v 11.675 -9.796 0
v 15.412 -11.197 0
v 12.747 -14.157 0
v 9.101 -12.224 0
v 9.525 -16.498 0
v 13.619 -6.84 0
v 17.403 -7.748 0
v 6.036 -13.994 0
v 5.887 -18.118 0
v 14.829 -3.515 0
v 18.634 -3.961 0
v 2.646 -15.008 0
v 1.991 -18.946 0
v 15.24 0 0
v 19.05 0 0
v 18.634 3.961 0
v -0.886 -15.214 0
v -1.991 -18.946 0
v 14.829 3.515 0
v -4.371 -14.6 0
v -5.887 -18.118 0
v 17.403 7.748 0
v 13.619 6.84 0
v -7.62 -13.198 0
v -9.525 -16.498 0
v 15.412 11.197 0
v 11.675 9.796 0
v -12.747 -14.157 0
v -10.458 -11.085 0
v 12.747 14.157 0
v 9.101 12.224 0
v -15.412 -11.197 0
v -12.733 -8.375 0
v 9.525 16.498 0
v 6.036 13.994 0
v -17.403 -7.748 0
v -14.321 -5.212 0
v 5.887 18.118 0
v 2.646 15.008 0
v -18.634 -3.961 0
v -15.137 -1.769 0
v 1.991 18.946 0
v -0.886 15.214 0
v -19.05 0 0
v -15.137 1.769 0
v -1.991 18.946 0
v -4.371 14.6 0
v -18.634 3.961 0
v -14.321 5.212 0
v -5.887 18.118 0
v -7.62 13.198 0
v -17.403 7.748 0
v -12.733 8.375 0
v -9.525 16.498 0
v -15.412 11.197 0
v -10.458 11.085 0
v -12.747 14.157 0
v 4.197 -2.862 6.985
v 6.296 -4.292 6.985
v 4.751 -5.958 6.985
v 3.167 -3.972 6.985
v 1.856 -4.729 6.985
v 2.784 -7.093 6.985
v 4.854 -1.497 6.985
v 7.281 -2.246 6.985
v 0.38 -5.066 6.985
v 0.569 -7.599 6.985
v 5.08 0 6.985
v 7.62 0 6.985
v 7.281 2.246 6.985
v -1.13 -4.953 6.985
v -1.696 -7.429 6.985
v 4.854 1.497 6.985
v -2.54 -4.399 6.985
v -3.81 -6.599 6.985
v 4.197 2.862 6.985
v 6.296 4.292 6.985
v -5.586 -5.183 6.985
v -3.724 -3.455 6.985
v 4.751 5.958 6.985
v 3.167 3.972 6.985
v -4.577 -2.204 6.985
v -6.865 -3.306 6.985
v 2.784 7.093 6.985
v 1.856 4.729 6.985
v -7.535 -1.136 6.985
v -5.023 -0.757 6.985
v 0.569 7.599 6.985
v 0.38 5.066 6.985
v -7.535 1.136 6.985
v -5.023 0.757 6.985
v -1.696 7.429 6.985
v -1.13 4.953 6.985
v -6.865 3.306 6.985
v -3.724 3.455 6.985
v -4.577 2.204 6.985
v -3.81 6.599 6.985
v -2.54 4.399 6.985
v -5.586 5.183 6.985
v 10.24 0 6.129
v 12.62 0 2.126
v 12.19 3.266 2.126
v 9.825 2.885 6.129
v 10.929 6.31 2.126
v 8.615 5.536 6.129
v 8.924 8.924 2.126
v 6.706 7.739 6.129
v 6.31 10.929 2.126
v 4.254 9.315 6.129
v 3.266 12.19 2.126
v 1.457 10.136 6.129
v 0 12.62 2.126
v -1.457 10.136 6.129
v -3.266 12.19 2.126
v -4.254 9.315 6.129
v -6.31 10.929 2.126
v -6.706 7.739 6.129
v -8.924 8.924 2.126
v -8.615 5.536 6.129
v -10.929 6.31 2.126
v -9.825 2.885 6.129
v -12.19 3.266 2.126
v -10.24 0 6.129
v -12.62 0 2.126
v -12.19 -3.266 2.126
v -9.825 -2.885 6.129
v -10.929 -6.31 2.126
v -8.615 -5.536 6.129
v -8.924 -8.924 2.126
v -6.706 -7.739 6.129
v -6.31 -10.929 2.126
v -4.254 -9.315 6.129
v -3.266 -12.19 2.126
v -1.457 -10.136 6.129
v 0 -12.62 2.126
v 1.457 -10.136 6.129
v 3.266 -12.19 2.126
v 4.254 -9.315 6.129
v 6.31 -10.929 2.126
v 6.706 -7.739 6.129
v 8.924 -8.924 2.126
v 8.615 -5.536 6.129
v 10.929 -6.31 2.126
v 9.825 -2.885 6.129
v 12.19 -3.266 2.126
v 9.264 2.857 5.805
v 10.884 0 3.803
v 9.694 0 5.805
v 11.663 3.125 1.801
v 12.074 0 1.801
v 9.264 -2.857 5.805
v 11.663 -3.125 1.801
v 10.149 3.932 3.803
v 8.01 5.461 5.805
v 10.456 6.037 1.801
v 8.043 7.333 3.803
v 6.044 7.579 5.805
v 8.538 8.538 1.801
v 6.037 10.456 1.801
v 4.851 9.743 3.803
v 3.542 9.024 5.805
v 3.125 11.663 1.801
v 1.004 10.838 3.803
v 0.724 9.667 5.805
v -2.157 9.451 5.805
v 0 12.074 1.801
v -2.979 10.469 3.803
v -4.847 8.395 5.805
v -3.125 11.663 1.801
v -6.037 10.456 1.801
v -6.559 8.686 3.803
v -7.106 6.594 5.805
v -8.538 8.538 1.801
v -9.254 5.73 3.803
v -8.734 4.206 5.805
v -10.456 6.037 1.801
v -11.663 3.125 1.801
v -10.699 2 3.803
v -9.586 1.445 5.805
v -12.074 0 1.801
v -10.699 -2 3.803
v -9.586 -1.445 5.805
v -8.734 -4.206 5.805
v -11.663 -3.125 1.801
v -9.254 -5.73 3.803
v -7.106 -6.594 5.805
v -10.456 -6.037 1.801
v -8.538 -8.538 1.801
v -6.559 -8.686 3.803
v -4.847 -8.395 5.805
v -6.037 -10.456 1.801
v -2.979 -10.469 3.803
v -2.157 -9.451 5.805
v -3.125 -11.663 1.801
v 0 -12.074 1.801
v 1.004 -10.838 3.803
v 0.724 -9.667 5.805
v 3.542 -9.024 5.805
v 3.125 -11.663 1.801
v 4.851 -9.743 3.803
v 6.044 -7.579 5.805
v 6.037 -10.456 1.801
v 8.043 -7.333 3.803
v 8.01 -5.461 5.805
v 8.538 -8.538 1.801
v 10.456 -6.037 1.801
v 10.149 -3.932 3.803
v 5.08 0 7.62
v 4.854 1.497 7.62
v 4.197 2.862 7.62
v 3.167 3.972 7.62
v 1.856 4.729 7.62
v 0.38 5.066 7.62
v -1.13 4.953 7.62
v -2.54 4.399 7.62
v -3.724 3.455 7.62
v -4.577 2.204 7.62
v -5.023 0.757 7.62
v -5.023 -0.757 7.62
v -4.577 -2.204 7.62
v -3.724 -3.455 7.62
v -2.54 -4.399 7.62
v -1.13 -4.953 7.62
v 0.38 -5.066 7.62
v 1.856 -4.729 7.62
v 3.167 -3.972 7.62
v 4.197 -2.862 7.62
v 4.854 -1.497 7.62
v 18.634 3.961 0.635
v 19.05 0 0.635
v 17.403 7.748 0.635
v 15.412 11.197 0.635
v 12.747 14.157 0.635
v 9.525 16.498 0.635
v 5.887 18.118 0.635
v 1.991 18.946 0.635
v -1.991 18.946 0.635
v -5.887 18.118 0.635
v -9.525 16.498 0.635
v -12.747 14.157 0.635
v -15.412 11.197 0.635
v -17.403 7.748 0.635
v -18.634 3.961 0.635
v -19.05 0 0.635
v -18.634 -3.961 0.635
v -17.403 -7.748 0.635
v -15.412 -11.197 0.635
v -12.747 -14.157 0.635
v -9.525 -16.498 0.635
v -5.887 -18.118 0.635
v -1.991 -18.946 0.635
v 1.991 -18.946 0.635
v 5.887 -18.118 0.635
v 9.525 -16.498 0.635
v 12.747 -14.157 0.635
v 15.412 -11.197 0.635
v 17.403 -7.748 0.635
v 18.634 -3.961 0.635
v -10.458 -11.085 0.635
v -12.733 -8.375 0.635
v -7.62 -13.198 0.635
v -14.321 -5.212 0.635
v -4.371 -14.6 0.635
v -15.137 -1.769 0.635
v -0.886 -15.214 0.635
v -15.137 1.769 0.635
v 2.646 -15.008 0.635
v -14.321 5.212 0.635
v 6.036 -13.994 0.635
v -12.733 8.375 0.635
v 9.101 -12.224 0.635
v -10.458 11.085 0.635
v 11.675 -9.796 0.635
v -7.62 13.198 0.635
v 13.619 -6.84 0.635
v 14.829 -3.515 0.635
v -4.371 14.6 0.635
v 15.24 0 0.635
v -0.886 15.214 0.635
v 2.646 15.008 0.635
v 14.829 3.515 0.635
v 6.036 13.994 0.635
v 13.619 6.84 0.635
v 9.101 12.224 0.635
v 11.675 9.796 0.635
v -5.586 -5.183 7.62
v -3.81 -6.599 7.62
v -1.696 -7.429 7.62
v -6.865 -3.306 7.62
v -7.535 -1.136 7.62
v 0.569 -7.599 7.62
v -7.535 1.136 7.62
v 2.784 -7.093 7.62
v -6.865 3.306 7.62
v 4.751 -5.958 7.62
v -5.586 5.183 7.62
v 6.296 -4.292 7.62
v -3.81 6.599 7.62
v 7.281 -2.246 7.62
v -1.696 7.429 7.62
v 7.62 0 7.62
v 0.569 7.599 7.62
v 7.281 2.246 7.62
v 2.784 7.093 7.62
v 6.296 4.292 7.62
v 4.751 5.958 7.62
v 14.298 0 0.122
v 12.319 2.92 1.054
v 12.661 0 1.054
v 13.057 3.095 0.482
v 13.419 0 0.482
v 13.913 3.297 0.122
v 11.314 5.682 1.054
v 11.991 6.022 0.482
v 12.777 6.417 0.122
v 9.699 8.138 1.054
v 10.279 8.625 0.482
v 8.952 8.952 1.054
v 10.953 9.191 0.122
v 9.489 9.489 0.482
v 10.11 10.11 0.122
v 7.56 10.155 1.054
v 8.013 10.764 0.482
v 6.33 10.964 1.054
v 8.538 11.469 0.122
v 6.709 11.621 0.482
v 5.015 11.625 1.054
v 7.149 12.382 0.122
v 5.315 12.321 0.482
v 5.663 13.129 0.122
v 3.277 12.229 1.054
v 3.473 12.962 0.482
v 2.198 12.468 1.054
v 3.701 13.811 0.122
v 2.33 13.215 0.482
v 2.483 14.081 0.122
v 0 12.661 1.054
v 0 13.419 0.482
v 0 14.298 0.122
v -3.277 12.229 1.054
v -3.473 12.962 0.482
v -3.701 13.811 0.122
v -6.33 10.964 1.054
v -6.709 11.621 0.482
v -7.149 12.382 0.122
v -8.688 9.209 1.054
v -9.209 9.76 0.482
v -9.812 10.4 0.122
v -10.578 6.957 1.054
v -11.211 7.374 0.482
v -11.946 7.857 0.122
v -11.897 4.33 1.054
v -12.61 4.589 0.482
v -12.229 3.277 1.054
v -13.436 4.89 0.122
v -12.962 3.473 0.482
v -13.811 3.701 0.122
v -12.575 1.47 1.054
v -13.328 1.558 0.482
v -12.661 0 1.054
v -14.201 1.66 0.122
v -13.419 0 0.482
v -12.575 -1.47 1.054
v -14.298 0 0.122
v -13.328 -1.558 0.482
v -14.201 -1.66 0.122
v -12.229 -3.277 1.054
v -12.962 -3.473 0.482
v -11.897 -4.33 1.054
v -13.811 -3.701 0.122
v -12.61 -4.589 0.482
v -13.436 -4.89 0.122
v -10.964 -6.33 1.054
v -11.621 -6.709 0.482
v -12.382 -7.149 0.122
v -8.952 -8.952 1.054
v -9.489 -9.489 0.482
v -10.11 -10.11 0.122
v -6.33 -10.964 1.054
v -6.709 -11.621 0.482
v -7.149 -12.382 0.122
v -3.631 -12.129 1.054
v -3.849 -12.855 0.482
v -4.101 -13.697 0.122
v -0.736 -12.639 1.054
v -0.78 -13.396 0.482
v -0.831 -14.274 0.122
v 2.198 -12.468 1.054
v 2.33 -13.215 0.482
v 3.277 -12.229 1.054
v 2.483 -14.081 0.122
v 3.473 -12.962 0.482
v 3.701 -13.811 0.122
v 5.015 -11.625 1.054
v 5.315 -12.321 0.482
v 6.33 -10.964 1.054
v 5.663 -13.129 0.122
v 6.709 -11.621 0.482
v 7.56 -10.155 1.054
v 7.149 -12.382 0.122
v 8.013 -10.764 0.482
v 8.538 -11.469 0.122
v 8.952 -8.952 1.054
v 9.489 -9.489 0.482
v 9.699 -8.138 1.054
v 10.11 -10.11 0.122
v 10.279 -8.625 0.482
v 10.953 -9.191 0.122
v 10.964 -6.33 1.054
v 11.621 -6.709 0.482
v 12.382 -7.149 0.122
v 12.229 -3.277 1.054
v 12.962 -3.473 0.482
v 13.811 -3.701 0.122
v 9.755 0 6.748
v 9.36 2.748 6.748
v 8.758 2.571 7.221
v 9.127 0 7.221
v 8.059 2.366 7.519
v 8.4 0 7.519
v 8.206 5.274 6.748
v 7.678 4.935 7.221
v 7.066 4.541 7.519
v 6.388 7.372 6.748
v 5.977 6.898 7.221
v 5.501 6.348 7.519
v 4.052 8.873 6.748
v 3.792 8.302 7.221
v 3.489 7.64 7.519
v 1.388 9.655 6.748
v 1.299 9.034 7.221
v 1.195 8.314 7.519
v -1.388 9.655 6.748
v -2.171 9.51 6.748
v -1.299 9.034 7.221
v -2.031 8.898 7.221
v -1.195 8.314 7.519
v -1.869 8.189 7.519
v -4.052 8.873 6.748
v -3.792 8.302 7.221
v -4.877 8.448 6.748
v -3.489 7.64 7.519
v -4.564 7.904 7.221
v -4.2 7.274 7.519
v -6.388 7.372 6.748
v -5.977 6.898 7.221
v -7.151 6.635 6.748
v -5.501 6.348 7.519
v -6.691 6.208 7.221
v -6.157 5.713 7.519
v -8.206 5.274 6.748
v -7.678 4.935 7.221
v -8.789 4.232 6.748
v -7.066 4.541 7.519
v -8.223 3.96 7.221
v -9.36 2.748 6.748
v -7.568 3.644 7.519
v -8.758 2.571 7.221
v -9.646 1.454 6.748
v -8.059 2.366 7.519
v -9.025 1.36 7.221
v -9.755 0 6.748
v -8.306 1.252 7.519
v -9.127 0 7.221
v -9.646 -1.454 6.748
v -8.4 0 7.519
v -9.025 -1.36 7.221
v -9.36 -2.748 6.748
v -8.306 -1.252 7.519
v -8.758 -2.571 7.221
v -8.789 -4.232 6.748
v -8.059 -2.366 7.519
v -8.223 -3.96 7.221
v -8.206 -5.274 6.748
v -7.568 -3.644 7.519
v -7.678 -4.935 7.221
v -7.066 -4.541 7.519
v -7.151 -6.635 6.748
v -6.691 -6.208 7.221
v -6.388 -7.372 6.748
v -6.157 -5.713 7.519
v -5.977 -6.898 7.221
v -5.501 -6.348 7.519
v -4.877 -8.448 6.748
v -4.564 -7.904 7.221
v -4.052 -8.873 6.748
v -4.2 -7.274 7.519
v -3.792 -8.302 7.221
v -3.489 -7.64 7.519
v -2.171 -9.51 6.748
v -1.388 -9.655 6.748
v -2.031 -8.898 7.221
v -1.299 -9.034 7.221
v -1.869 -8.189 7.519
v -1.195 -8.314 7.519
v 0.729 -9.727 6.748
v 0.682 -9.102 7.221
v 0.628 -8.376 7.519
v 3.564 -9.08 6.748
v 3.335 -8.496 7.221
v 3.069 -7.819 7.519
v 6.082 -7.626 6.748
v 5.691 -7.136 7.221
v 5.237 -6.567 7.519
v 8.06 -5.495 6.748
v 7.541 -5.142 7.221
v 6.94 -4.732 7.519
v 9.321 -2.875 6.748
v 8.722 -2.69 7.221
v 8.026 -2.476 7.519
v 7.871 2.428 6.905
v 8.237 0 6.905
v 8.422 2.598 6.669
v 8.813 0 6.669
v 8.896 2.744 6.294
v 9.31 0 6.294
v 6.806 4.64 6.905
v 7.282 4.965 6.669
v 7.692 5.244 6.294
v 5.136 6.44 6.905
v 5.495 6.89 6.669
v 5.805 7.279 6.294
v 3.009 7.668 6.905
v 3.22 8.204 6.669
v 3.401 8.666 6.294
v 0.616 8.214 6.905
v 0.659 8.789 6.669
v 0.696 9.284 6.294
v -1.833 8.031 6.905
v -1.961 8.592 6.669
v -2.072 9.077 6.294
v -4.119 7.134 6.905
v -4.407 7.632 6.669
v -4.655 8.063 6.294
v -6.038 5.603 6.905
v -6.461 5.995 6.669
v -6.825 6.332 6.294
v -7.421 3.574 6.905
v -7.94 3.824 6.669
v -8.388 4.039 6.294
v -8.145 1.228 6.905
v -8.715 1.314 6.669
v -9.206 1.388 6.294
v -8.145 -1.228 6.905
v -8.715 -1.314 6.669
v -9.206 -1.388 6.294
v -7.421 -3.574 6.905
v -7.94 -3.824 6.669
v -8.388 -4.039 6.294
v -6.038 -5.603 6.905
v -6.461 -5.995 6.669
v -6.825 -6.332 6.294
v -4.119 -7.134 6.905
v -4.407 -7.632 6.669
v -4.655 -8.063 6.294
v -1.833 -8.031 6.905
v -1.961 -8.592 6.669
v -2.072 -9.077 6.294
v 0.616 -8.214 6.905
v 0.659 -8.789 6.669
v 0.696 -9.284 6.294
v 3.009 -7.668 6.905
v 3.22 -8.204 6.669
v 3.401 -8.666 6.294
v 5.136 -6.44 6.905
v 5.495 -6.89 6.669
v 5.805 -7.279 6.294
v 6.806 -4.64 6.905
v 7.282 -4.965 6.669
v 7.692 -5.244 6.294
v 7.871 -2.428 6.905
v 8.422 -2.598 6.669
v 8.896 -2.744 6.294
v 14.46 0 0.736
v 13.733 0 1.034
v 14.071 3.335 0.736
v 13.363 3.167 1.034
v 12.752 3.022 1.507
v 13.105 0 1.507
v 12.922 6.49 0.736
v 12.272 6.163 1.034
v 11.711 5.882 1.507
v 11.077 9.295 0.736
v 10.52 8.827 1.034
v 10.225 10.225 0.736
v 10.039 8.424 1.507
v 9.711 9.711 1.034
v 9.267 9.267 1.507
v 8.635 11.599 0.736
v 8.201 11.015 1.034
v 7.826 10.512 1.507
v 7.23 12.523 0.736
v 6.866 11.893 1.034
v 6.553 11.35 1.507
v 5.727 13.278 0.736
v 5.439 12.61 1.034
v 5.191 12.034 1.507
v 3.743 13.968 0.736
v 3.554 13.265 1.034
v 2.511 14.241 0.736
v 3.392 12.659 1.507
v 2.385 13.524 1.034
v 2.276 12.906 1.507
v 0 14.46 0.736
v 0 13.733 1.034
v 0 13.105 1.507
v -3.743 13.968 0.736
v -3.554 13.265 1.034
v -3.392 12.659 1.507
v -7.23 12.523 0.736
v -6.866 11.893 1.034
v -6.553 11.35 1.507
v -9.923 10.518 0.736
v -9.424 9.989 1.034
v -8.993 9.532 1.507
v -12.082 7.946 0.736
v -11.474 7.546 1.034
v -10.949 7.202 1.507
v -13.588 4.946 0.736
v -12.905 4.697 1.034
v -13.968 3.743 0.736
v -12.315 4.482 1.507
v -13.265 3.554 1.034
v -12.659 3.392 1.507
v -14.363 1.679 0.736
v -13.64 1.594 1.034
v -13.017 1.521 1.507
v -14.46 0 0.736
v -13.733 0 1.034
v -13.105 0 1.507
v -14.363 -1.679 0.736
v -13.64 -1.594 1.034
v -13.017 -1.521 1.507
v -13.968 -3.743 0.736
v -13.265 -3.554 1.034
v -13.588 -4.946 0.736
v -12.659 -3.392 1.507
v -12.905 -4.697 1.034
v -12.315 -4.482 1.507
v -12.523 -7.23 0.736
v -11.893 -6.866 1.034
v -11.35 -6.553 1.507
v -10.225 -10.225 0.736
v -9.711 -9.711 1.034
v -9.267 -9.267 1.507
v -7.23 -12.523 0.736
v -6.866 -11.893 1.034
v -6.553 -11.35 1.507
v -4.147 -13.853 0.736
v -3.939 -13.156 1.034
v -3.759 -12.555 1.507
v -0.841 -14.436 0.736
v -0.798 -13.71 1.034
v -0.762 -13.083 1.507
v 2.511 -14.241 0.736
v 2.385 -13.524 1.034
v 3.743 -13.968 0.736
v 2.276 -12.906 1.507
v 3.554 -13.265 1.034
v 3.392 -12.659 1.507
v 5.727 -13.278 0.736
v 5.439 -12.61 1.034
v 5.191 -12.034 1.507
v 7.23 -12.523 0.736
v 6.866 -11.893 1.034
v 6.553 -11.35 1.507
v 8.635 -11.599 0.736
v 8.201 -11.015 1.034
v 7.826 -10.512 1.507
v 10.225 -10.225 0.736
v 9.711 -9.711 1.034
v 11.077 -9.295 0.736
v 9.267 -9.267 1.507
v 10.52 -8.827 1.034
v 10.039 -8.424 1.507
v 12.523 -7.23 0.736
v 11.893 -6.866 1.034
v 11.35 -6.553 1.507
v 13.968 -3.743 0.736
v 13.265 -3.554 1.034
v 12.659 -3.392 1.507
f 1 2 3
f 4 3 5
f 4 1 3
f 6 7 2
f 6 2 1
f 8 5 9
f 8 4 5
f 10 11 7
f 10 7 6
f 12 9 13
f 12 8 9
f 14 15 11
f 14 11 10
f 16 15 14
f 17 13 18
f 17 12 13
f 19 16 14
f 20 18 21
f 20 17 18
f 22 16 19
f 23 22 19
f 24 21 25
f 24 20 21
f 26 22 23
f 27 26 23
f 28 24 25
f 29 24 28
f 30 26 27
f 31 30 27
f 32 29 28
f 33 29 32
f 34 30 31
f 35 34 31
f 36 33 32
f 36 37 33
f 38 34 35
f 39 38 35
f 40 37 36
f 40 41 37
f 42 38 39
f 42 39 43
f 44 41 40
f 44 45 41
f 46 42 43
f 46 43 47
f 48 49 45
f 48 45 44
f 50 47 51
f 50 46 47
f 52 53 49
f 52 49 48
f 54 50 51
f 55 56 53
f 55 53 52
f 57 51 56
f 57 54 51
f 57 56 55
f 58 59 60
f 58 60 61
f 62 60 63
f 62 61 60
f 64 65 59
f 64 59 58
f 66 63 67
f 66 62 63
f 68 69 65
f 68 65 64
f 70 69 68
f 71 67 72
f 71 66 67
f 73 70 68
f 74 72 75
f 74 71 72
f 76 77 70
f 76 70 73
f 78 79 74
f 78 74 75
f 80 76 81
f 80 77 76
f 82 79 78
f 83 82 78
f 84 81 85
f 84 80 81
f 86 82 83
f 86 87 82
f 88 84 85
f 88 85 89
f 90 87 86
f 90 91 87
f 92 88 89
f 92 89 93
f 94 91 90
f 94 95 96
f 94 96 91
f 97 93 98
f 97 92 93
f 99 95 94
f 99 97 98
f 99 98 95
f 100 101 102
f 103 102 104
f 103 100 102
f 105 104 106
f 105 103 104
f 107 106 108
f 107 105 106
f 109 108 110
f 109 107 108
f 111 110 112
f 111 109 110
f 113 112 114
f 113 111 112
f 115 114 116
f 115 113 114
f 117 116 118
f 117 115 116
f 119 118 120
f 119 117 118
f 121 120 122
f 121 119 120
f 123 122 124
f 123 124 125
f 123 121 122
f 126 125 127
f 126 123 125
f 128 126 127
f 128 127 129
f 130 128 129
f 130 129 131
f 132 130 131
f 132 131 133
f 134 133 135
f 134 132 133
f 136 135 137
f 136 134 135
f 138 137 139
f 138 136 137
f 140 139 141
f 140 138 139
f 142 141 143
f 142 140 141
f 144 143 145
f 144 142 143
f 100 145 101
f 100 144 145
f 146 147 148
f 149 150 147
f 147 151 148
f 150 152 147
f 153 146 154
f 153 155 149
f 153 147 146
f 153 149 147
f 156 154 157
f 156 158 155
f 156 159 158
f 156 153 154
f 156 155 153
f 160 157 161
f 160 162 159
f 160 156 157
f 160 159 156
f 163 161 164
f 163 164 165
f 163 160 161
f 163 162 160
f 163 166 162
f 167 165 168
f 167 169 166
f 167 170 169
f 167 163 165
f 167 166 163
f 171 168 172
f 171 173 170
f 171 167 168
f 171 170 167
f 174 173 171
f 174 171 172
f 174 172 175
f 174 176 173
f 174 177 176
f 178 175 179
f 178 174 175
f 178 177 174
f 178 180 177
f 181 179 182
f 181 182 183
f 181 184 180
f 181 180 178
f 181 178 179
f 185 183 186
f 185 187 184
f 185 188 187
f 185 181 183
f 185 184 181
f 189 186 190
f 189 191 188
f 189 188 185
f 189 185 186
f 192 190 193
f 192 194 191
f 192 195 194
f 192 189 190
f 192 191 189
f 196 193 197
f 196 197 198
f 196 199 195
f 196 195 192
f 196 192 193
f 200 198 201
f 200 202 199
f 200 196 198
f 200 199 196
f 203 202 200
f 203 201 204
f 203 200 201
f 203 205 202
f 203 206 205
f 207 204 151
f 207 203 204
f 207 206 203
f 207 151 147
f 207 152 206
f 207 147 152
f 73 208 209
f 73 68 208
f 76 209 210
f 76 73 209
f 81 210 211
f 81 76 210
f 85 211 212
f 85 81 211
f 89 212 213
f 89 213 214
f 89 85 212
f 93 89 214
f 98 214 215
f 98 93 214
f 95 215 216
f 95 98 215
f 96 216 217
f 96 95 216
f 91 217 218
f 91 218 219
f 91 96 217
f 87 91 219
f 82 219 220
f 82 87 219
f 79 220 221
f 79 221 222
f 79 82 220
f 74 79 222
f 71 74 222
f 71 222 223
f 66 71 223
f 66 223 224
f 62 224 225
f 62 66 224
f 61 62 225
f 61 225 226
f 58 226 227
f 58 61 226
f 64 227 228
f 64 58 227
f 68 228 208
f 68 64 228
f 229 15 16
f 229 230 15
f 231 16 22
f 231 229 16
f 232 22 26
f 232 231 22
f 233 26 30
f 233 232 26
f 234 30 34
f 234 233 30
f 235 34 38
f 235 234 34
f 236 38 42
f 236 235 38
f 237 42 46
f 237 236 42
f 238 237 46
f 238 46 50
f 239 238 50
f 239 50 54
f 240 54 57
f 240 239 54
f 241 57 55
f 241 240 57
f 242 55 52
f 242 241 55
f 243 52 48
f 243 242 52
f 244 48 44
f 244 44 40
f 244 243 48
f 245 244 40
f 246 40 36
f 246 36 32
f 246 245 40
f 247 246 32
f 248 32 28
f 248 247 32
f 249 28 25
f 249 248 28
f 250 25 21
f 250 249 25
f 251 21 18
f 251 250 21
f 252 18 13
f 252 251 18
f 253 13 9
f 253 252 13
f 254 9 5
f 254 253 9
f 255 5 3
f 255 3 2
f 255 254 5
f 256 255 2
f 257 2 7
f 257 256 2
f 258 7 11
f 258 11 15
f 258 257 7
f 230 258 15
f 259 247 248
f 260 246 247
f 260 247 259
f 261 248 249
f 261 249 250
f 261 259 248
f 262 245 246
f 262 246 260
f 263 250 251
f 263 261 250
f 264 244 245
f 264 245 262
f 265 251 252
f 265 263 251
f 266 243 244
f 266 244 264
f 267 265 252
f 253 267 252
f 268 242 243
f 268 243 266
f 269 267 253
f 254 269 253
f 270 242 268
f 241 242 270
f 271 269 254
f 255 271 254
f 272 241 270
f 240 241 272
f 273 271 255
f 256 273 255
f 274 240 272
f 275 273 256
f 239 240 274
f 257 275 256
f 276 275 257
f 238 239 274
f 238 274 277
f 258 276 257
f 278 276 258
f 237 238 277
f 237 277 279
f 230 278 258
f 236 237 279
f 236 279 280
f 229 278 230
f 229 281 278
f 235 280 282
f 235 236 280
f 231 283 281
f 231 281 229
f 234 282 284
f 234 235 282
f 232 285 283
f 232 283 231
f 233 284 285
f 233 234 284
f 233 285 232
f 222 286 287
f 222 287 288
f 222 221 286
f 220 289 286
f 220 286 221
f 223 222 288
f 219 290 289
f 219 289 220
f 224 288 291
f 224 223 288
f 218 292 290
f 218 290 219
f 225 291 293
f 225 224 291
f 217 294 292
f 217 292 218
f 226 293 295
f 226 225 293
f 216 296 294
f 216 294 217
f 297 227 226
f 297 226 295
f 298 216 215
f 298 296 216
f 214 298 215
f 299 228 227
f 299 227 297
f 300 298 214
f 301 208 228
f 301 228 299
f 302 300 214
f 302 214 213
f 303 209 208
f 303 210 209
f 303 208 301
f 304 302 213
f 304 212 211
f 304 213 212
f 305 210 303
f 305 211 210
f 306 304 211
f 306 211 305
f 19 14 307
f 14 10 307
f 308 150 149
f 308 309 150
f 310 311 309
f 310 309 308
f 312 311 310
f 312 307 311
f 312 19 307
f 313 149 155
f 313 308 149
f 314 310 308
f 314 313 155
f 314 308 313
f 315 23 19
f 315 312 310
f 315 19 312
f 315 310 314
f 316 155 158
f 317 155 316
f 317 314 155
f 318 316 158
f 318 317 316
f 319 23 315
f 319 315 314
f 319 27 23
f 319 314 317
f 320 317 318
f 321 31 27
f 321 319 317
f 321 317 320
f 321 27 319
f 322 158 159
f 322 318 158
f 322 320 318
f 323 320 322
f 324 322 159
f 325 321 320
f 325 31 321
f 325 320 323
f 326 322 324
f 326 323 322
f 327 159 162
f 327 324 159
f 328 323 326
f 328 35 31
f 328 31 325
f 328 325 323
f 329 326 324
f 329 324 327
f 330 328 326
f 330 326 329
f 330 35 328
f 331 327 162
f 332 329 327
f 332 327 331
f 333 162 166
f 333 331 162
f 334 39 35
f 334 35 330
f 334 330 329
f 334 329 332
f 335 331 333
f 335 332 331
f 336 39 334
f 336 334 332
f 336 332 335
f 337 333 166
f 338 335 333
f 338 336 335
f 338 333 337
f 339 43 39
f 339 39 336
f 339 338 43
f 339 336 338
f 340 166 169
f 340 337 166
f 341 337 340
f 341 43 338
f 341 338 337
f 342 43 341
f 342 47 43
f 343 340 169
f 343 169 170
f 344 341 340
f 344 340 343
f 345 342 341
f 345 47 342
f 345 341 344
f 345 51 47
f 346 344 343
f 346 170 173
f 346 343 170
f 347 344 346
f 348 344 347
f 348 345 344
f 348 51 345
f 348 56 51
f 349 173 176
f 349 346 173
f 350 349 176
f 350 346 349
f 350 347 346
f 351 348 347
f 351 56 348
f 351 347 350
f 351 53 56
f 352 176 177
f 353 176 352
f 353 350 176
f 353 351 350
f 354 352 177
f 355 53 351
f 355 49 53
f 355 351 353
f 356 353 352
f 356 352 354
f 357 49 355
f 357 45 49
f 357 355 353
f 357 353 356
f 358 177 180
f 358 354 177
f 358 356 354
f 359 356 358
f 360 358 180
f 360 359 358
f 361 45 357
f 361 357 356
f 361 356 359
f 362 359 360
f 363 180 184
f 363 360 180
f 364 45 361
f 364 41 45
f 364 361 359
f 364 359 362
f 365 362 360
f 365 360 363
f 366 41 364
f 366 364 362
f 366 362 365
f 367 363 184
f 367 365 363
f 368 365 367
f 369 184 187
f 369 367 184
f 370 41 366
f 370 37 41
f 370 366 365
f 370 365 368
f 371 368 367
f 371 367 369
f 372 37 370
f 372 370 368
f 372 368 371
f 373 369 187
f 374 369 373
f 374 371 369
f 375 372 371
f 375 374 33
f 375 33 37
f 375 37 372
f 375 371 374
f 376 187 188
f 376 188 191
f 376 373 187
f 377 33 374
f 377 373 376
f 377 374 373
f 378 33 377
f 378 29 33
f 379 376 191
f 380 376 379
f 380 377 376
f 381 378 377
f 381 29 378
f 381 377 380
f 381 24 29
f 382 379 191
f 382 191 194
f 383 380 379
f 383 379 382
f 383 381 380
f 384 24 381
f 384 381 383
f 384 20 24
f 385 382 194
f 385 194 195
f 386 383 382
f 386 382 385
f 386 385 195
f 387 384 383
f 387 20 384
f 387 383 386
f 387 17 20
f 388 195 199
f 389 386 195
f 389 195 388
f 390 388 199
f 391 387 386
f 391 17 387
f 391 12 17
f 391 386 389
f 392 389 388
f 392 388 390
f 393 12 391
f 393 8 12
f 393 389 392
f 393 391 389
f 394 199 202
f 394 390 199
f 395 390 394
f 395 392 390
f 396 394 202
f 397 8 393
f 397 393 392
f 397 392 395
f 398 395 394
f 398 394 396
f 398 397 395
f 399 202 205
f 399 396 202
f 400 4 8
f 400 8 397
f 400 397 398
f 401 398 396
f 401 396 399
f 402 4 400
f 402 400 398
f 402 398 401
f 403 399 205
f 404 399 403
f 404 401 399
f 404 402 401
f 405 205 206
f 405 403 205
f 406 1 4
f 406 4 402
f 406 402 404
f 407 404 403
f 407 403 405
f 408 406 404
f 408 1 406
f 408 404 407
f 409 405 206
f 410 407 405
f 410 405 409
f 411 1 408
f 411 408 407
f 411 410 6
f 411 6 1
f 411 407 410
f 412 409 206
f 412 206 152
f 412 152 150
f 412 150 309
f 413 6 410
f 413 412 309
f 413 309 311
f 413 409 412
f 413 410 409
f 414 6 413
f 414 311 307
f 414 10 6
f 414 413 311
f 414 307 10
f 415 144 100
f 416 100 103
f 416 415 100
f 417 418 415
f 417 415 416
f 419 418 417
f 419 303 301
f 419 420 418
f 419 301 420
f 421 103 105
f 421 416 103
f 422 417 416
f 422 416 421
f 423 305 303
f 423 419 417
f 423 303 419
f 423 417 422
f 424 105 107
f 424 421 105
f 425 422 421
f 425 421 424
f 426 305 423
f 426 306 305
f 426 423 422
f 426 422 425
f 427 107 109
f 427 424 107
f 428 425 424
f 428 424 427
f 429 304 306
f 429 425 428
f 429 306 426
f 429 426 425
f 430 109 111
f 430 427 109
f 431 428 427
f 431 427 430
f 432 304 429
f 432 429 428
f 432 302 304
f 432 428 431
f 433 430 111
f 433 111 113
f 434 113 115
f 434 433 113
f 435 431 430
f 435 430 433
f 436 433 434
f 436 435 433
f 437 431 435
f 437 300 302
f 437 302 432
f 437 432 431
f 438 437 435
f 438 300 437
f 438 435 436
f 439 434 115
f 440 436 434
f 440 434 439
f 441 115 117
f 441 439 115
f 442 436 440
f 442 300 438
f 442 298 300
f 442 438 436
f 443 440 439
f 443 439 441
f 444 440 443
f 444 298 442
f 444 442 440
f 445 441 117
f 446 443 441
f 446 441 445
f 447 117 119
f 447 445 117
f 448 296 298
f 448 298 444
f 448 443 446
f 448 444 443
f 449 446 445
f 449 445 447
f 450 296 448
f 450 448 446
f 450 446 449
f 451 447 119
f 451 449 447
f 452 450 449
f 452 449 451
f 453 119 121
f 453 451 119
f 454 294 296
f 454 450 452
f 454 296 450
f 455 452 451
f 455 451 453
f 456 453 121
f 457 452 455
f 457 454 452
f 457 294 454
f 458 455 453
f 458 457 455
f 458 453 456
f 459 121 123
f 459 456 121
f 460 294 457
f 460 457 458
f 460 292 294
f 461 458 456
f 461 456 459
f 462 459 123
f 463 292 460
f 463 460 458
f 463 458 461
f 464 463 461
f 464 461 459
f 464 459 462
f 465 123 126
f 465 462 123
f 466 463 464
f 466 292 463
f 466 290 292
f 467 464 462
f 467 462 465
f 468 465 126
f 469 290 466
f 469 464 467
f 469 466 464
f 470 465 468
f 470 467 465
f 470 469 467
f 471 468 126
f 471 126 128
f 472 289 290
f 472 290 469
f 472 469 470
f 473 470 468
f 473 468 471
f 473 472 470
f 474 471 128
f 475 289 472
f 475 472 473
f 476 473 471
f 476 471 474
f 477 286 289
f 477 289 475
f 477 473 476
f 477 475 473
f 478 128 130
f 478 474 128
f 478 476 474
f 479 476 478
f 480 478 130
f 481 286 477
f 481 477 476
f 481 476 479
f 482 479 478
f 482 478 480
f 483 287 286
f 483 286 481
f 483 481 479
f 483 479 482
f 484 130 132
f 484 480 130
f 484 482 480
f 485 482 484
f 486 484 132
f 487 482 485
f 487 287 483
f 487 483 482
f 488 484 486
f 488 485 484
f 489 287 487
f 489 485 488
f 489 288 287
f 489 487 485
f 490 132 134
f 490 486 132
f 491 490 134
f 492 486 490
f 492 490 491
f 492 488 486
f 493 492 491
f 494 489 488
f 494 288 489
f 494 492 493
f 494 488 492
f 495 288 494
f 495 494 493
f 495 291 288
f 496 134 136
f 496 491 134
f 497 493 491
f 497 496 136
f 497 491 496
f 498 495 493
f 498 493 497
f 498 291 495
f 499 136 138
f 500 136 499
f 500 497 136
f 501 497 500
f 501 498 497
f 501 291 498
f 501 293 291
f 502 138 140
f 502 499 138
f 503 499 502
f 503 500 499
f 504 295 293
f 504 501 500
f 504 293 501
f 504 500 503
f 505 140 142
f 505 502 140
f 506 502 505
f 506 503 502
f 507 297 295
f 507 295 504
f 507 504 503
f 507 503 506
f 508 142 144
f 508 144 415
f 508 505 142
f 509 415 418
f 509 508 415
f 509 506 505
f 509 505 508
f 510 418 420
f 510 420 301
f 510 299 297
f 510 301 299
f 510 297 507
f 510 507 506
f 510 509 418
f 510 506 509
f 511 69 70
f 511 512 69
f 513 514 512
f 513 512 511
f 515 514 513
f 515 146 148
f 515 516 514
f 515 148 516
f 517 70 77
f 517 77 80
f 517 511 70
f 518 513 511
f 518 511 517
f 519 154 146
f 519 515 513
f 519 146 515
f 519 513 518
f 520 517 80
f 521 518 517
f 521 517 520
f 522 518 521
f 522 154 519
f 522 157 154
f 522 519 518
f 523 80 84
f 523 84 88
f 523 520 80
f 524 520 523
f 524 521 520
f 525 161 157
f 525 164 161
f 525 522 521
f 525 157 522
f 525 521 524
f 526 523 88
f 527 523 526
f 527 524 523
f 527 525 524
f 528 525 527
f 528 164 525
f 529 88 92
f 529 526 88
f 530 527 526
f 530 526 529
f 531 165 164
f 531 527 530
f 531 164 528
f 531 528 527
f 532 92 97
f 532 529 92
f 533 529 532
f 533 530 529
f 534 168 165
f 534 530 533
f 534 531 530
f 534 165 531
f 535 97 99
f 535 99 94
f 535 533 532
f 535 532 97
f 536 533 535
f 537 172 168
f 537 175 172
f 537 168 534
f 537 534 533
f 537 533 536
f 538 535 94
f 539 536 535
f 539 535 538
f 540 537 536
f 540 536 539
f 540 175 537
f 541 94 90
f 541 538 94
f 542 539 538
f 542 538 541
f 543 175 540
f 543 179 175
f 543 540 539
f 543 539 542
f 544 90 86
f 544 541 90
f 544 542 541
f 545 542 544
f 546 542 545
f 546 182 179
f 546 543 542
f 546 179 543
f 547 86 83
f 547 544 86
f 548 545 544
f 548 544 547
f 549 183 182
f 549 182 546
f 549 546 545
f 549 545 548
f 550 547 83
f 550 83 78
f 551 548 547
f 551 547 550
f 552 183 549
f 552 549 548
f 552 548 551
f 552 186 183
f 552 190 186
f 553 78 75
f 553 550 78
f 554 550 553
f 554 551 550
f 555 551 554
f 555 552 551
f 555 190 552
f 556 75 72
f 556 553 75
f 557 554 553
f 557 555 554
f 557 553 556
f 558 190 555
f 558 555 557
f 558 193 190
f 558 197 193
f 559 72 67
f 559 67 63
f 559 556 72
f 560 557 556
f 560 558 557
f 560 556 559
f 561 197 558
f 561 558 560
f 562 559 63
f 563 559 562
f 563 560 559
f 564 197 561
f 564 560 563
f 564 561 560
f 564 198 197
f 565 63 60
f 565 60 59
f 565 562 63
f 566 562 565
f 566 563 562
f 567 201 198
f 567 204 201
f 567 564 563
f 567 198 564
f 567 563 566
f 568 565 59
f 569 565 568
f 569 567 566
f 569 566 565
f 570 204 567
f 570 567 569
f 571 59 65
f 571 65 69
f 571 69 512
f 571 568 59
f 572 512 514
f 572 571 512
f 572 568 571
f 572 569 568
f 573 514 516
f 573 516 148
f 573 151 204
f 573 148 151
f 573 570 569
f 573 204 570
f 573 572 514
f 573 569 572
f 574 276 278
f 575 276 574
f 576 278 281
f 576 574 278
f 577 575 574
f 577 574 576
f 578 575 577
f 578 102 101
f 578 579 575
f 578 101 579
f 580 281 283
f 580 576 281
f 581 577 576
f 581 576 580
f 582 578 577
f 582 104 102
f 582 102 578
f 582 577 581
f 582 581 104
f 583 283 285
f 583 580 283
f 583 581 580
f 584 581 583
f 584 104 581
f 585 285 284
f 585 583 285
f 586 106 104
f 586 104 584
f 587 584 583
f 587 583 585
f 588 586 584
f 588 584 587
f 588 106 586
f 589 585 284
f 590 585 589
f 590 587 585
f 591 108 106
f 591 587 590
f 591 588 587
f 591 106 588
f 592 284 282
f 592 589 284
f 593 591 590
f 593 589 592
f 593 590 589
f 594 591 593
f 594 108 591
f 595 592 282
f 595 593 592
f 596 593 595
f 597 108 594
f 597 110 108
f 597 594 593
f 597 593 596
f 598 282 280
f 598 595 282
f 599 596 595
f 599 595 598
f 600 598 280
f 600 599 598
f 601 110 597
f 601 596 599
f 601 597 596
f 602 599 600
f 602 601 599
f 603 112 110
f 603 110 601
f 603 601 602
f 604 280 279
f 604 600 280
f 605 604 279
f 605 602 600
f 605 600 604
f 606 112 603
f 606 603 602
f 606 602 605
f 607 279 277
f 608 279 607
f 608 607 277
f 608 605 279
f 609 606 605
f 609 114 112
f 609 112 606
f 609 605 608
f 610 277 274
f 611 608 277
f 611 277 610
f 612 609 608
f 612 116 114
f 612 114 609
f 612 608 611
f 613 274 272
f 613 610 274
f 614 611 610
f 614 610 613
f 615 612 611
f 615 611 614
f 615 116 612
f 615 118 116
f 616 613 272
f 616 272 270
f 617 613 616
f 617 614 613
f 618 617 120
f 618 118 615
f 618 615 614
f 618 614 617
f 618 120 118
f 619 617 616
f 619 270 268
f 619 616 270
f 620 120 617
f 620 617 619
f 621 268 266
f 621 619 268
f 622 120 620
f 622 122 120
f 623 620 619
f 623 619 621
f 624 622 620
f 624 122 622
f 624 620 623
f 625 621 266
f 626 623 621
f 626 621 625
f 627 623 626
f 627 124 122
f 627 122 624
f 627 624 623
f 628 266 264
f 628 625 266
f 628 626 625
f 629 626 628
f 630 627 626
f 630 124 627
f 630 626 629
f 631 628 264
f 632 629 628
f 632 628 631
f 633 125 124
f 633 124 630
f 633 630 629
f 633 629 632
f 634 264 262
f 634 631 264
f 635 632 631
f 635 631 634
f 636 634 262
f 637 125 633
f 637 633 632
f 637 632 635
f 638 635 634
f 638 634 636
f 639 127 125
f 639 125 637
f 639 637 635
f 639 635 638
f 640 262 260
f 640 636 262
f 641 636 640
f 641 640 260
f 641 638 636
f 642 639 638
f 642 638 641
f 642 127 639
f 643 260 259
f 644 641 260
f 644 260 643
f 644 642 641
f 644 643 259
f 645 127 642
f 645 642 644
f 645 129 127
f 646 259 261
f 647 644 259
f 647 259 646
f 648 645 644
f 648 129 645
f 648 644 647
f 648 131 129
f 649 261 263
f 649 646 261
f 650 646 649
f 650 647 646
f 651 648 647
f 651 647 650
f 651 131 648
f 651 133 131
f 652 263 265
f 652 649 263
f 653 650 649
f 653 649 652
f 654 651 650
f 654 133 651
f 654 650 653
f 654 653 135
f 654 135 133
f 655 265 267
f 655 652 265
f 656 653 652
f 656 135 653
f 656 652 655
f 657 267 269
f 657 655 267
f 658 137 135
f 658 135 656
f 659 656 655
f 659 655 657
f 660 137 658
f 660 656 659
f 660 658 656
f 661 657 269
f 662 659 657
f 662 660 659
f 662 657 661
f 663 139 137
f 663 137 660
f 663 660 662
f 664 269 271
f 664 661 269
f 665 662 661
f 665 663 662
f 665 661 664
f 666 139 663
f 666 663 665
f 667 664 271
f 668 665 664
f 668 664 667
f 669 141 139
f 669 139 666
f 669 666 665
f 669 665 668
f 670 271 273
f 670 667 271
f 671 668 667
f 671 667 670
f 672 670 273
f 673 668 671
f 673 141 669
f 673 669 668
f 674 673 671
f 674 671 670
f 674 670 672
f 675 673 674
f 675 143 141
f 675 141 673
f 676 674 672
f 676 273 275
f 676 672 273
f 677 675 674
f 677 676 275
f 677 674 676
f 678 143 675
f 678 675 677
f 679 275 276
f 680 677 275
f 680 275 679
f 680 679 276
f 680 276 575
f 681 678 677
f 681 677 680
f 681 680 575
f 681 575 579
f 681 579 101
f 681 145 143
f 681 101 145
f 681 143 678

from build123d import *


with BuildPart() as f1:
    # F0 (on Front) → F1 (revolve)
    with BuildSketch(Plane.XZ):
        with BuildLine():
            Line((7.62, 7.62), (5.08, 7.62))
            Line((5.08, 7.62), (5.08, 6.985))
            Line((5.08, 6.985), (7.62, 6.985))
            ThreePointArc((7.62, 6.985), (8.813216, 6.669333), (9.694241, 5.804921))
            Line((9.694241, 5.804921), (12.074054, 1.801173))
            ThreePointArc((12.074054, 1.801173), (13.418775, 0.481808), (15.24, 0))
            Line((15.24, 0), (19.05, 0))
            Line((19.05, 0), (19.05, 0.635))
            Line((19.05, 0.635), (15.24, 0.635))
            ThreePointArc((15.24, 0.635), (13.732779, 1.033738), (12.619906, 2.125626))
            Line((12.619906, 2.125626), (10.240094, 6.129374))
            ThreePointArc((10.240094, 6.129374), (9.127221, 7.221262), (7.62, 7.62))
        make_face()
    revolve(axis=Axis((0, 0, 3.02236), (0, 0, 1)))


solid = f1.part
